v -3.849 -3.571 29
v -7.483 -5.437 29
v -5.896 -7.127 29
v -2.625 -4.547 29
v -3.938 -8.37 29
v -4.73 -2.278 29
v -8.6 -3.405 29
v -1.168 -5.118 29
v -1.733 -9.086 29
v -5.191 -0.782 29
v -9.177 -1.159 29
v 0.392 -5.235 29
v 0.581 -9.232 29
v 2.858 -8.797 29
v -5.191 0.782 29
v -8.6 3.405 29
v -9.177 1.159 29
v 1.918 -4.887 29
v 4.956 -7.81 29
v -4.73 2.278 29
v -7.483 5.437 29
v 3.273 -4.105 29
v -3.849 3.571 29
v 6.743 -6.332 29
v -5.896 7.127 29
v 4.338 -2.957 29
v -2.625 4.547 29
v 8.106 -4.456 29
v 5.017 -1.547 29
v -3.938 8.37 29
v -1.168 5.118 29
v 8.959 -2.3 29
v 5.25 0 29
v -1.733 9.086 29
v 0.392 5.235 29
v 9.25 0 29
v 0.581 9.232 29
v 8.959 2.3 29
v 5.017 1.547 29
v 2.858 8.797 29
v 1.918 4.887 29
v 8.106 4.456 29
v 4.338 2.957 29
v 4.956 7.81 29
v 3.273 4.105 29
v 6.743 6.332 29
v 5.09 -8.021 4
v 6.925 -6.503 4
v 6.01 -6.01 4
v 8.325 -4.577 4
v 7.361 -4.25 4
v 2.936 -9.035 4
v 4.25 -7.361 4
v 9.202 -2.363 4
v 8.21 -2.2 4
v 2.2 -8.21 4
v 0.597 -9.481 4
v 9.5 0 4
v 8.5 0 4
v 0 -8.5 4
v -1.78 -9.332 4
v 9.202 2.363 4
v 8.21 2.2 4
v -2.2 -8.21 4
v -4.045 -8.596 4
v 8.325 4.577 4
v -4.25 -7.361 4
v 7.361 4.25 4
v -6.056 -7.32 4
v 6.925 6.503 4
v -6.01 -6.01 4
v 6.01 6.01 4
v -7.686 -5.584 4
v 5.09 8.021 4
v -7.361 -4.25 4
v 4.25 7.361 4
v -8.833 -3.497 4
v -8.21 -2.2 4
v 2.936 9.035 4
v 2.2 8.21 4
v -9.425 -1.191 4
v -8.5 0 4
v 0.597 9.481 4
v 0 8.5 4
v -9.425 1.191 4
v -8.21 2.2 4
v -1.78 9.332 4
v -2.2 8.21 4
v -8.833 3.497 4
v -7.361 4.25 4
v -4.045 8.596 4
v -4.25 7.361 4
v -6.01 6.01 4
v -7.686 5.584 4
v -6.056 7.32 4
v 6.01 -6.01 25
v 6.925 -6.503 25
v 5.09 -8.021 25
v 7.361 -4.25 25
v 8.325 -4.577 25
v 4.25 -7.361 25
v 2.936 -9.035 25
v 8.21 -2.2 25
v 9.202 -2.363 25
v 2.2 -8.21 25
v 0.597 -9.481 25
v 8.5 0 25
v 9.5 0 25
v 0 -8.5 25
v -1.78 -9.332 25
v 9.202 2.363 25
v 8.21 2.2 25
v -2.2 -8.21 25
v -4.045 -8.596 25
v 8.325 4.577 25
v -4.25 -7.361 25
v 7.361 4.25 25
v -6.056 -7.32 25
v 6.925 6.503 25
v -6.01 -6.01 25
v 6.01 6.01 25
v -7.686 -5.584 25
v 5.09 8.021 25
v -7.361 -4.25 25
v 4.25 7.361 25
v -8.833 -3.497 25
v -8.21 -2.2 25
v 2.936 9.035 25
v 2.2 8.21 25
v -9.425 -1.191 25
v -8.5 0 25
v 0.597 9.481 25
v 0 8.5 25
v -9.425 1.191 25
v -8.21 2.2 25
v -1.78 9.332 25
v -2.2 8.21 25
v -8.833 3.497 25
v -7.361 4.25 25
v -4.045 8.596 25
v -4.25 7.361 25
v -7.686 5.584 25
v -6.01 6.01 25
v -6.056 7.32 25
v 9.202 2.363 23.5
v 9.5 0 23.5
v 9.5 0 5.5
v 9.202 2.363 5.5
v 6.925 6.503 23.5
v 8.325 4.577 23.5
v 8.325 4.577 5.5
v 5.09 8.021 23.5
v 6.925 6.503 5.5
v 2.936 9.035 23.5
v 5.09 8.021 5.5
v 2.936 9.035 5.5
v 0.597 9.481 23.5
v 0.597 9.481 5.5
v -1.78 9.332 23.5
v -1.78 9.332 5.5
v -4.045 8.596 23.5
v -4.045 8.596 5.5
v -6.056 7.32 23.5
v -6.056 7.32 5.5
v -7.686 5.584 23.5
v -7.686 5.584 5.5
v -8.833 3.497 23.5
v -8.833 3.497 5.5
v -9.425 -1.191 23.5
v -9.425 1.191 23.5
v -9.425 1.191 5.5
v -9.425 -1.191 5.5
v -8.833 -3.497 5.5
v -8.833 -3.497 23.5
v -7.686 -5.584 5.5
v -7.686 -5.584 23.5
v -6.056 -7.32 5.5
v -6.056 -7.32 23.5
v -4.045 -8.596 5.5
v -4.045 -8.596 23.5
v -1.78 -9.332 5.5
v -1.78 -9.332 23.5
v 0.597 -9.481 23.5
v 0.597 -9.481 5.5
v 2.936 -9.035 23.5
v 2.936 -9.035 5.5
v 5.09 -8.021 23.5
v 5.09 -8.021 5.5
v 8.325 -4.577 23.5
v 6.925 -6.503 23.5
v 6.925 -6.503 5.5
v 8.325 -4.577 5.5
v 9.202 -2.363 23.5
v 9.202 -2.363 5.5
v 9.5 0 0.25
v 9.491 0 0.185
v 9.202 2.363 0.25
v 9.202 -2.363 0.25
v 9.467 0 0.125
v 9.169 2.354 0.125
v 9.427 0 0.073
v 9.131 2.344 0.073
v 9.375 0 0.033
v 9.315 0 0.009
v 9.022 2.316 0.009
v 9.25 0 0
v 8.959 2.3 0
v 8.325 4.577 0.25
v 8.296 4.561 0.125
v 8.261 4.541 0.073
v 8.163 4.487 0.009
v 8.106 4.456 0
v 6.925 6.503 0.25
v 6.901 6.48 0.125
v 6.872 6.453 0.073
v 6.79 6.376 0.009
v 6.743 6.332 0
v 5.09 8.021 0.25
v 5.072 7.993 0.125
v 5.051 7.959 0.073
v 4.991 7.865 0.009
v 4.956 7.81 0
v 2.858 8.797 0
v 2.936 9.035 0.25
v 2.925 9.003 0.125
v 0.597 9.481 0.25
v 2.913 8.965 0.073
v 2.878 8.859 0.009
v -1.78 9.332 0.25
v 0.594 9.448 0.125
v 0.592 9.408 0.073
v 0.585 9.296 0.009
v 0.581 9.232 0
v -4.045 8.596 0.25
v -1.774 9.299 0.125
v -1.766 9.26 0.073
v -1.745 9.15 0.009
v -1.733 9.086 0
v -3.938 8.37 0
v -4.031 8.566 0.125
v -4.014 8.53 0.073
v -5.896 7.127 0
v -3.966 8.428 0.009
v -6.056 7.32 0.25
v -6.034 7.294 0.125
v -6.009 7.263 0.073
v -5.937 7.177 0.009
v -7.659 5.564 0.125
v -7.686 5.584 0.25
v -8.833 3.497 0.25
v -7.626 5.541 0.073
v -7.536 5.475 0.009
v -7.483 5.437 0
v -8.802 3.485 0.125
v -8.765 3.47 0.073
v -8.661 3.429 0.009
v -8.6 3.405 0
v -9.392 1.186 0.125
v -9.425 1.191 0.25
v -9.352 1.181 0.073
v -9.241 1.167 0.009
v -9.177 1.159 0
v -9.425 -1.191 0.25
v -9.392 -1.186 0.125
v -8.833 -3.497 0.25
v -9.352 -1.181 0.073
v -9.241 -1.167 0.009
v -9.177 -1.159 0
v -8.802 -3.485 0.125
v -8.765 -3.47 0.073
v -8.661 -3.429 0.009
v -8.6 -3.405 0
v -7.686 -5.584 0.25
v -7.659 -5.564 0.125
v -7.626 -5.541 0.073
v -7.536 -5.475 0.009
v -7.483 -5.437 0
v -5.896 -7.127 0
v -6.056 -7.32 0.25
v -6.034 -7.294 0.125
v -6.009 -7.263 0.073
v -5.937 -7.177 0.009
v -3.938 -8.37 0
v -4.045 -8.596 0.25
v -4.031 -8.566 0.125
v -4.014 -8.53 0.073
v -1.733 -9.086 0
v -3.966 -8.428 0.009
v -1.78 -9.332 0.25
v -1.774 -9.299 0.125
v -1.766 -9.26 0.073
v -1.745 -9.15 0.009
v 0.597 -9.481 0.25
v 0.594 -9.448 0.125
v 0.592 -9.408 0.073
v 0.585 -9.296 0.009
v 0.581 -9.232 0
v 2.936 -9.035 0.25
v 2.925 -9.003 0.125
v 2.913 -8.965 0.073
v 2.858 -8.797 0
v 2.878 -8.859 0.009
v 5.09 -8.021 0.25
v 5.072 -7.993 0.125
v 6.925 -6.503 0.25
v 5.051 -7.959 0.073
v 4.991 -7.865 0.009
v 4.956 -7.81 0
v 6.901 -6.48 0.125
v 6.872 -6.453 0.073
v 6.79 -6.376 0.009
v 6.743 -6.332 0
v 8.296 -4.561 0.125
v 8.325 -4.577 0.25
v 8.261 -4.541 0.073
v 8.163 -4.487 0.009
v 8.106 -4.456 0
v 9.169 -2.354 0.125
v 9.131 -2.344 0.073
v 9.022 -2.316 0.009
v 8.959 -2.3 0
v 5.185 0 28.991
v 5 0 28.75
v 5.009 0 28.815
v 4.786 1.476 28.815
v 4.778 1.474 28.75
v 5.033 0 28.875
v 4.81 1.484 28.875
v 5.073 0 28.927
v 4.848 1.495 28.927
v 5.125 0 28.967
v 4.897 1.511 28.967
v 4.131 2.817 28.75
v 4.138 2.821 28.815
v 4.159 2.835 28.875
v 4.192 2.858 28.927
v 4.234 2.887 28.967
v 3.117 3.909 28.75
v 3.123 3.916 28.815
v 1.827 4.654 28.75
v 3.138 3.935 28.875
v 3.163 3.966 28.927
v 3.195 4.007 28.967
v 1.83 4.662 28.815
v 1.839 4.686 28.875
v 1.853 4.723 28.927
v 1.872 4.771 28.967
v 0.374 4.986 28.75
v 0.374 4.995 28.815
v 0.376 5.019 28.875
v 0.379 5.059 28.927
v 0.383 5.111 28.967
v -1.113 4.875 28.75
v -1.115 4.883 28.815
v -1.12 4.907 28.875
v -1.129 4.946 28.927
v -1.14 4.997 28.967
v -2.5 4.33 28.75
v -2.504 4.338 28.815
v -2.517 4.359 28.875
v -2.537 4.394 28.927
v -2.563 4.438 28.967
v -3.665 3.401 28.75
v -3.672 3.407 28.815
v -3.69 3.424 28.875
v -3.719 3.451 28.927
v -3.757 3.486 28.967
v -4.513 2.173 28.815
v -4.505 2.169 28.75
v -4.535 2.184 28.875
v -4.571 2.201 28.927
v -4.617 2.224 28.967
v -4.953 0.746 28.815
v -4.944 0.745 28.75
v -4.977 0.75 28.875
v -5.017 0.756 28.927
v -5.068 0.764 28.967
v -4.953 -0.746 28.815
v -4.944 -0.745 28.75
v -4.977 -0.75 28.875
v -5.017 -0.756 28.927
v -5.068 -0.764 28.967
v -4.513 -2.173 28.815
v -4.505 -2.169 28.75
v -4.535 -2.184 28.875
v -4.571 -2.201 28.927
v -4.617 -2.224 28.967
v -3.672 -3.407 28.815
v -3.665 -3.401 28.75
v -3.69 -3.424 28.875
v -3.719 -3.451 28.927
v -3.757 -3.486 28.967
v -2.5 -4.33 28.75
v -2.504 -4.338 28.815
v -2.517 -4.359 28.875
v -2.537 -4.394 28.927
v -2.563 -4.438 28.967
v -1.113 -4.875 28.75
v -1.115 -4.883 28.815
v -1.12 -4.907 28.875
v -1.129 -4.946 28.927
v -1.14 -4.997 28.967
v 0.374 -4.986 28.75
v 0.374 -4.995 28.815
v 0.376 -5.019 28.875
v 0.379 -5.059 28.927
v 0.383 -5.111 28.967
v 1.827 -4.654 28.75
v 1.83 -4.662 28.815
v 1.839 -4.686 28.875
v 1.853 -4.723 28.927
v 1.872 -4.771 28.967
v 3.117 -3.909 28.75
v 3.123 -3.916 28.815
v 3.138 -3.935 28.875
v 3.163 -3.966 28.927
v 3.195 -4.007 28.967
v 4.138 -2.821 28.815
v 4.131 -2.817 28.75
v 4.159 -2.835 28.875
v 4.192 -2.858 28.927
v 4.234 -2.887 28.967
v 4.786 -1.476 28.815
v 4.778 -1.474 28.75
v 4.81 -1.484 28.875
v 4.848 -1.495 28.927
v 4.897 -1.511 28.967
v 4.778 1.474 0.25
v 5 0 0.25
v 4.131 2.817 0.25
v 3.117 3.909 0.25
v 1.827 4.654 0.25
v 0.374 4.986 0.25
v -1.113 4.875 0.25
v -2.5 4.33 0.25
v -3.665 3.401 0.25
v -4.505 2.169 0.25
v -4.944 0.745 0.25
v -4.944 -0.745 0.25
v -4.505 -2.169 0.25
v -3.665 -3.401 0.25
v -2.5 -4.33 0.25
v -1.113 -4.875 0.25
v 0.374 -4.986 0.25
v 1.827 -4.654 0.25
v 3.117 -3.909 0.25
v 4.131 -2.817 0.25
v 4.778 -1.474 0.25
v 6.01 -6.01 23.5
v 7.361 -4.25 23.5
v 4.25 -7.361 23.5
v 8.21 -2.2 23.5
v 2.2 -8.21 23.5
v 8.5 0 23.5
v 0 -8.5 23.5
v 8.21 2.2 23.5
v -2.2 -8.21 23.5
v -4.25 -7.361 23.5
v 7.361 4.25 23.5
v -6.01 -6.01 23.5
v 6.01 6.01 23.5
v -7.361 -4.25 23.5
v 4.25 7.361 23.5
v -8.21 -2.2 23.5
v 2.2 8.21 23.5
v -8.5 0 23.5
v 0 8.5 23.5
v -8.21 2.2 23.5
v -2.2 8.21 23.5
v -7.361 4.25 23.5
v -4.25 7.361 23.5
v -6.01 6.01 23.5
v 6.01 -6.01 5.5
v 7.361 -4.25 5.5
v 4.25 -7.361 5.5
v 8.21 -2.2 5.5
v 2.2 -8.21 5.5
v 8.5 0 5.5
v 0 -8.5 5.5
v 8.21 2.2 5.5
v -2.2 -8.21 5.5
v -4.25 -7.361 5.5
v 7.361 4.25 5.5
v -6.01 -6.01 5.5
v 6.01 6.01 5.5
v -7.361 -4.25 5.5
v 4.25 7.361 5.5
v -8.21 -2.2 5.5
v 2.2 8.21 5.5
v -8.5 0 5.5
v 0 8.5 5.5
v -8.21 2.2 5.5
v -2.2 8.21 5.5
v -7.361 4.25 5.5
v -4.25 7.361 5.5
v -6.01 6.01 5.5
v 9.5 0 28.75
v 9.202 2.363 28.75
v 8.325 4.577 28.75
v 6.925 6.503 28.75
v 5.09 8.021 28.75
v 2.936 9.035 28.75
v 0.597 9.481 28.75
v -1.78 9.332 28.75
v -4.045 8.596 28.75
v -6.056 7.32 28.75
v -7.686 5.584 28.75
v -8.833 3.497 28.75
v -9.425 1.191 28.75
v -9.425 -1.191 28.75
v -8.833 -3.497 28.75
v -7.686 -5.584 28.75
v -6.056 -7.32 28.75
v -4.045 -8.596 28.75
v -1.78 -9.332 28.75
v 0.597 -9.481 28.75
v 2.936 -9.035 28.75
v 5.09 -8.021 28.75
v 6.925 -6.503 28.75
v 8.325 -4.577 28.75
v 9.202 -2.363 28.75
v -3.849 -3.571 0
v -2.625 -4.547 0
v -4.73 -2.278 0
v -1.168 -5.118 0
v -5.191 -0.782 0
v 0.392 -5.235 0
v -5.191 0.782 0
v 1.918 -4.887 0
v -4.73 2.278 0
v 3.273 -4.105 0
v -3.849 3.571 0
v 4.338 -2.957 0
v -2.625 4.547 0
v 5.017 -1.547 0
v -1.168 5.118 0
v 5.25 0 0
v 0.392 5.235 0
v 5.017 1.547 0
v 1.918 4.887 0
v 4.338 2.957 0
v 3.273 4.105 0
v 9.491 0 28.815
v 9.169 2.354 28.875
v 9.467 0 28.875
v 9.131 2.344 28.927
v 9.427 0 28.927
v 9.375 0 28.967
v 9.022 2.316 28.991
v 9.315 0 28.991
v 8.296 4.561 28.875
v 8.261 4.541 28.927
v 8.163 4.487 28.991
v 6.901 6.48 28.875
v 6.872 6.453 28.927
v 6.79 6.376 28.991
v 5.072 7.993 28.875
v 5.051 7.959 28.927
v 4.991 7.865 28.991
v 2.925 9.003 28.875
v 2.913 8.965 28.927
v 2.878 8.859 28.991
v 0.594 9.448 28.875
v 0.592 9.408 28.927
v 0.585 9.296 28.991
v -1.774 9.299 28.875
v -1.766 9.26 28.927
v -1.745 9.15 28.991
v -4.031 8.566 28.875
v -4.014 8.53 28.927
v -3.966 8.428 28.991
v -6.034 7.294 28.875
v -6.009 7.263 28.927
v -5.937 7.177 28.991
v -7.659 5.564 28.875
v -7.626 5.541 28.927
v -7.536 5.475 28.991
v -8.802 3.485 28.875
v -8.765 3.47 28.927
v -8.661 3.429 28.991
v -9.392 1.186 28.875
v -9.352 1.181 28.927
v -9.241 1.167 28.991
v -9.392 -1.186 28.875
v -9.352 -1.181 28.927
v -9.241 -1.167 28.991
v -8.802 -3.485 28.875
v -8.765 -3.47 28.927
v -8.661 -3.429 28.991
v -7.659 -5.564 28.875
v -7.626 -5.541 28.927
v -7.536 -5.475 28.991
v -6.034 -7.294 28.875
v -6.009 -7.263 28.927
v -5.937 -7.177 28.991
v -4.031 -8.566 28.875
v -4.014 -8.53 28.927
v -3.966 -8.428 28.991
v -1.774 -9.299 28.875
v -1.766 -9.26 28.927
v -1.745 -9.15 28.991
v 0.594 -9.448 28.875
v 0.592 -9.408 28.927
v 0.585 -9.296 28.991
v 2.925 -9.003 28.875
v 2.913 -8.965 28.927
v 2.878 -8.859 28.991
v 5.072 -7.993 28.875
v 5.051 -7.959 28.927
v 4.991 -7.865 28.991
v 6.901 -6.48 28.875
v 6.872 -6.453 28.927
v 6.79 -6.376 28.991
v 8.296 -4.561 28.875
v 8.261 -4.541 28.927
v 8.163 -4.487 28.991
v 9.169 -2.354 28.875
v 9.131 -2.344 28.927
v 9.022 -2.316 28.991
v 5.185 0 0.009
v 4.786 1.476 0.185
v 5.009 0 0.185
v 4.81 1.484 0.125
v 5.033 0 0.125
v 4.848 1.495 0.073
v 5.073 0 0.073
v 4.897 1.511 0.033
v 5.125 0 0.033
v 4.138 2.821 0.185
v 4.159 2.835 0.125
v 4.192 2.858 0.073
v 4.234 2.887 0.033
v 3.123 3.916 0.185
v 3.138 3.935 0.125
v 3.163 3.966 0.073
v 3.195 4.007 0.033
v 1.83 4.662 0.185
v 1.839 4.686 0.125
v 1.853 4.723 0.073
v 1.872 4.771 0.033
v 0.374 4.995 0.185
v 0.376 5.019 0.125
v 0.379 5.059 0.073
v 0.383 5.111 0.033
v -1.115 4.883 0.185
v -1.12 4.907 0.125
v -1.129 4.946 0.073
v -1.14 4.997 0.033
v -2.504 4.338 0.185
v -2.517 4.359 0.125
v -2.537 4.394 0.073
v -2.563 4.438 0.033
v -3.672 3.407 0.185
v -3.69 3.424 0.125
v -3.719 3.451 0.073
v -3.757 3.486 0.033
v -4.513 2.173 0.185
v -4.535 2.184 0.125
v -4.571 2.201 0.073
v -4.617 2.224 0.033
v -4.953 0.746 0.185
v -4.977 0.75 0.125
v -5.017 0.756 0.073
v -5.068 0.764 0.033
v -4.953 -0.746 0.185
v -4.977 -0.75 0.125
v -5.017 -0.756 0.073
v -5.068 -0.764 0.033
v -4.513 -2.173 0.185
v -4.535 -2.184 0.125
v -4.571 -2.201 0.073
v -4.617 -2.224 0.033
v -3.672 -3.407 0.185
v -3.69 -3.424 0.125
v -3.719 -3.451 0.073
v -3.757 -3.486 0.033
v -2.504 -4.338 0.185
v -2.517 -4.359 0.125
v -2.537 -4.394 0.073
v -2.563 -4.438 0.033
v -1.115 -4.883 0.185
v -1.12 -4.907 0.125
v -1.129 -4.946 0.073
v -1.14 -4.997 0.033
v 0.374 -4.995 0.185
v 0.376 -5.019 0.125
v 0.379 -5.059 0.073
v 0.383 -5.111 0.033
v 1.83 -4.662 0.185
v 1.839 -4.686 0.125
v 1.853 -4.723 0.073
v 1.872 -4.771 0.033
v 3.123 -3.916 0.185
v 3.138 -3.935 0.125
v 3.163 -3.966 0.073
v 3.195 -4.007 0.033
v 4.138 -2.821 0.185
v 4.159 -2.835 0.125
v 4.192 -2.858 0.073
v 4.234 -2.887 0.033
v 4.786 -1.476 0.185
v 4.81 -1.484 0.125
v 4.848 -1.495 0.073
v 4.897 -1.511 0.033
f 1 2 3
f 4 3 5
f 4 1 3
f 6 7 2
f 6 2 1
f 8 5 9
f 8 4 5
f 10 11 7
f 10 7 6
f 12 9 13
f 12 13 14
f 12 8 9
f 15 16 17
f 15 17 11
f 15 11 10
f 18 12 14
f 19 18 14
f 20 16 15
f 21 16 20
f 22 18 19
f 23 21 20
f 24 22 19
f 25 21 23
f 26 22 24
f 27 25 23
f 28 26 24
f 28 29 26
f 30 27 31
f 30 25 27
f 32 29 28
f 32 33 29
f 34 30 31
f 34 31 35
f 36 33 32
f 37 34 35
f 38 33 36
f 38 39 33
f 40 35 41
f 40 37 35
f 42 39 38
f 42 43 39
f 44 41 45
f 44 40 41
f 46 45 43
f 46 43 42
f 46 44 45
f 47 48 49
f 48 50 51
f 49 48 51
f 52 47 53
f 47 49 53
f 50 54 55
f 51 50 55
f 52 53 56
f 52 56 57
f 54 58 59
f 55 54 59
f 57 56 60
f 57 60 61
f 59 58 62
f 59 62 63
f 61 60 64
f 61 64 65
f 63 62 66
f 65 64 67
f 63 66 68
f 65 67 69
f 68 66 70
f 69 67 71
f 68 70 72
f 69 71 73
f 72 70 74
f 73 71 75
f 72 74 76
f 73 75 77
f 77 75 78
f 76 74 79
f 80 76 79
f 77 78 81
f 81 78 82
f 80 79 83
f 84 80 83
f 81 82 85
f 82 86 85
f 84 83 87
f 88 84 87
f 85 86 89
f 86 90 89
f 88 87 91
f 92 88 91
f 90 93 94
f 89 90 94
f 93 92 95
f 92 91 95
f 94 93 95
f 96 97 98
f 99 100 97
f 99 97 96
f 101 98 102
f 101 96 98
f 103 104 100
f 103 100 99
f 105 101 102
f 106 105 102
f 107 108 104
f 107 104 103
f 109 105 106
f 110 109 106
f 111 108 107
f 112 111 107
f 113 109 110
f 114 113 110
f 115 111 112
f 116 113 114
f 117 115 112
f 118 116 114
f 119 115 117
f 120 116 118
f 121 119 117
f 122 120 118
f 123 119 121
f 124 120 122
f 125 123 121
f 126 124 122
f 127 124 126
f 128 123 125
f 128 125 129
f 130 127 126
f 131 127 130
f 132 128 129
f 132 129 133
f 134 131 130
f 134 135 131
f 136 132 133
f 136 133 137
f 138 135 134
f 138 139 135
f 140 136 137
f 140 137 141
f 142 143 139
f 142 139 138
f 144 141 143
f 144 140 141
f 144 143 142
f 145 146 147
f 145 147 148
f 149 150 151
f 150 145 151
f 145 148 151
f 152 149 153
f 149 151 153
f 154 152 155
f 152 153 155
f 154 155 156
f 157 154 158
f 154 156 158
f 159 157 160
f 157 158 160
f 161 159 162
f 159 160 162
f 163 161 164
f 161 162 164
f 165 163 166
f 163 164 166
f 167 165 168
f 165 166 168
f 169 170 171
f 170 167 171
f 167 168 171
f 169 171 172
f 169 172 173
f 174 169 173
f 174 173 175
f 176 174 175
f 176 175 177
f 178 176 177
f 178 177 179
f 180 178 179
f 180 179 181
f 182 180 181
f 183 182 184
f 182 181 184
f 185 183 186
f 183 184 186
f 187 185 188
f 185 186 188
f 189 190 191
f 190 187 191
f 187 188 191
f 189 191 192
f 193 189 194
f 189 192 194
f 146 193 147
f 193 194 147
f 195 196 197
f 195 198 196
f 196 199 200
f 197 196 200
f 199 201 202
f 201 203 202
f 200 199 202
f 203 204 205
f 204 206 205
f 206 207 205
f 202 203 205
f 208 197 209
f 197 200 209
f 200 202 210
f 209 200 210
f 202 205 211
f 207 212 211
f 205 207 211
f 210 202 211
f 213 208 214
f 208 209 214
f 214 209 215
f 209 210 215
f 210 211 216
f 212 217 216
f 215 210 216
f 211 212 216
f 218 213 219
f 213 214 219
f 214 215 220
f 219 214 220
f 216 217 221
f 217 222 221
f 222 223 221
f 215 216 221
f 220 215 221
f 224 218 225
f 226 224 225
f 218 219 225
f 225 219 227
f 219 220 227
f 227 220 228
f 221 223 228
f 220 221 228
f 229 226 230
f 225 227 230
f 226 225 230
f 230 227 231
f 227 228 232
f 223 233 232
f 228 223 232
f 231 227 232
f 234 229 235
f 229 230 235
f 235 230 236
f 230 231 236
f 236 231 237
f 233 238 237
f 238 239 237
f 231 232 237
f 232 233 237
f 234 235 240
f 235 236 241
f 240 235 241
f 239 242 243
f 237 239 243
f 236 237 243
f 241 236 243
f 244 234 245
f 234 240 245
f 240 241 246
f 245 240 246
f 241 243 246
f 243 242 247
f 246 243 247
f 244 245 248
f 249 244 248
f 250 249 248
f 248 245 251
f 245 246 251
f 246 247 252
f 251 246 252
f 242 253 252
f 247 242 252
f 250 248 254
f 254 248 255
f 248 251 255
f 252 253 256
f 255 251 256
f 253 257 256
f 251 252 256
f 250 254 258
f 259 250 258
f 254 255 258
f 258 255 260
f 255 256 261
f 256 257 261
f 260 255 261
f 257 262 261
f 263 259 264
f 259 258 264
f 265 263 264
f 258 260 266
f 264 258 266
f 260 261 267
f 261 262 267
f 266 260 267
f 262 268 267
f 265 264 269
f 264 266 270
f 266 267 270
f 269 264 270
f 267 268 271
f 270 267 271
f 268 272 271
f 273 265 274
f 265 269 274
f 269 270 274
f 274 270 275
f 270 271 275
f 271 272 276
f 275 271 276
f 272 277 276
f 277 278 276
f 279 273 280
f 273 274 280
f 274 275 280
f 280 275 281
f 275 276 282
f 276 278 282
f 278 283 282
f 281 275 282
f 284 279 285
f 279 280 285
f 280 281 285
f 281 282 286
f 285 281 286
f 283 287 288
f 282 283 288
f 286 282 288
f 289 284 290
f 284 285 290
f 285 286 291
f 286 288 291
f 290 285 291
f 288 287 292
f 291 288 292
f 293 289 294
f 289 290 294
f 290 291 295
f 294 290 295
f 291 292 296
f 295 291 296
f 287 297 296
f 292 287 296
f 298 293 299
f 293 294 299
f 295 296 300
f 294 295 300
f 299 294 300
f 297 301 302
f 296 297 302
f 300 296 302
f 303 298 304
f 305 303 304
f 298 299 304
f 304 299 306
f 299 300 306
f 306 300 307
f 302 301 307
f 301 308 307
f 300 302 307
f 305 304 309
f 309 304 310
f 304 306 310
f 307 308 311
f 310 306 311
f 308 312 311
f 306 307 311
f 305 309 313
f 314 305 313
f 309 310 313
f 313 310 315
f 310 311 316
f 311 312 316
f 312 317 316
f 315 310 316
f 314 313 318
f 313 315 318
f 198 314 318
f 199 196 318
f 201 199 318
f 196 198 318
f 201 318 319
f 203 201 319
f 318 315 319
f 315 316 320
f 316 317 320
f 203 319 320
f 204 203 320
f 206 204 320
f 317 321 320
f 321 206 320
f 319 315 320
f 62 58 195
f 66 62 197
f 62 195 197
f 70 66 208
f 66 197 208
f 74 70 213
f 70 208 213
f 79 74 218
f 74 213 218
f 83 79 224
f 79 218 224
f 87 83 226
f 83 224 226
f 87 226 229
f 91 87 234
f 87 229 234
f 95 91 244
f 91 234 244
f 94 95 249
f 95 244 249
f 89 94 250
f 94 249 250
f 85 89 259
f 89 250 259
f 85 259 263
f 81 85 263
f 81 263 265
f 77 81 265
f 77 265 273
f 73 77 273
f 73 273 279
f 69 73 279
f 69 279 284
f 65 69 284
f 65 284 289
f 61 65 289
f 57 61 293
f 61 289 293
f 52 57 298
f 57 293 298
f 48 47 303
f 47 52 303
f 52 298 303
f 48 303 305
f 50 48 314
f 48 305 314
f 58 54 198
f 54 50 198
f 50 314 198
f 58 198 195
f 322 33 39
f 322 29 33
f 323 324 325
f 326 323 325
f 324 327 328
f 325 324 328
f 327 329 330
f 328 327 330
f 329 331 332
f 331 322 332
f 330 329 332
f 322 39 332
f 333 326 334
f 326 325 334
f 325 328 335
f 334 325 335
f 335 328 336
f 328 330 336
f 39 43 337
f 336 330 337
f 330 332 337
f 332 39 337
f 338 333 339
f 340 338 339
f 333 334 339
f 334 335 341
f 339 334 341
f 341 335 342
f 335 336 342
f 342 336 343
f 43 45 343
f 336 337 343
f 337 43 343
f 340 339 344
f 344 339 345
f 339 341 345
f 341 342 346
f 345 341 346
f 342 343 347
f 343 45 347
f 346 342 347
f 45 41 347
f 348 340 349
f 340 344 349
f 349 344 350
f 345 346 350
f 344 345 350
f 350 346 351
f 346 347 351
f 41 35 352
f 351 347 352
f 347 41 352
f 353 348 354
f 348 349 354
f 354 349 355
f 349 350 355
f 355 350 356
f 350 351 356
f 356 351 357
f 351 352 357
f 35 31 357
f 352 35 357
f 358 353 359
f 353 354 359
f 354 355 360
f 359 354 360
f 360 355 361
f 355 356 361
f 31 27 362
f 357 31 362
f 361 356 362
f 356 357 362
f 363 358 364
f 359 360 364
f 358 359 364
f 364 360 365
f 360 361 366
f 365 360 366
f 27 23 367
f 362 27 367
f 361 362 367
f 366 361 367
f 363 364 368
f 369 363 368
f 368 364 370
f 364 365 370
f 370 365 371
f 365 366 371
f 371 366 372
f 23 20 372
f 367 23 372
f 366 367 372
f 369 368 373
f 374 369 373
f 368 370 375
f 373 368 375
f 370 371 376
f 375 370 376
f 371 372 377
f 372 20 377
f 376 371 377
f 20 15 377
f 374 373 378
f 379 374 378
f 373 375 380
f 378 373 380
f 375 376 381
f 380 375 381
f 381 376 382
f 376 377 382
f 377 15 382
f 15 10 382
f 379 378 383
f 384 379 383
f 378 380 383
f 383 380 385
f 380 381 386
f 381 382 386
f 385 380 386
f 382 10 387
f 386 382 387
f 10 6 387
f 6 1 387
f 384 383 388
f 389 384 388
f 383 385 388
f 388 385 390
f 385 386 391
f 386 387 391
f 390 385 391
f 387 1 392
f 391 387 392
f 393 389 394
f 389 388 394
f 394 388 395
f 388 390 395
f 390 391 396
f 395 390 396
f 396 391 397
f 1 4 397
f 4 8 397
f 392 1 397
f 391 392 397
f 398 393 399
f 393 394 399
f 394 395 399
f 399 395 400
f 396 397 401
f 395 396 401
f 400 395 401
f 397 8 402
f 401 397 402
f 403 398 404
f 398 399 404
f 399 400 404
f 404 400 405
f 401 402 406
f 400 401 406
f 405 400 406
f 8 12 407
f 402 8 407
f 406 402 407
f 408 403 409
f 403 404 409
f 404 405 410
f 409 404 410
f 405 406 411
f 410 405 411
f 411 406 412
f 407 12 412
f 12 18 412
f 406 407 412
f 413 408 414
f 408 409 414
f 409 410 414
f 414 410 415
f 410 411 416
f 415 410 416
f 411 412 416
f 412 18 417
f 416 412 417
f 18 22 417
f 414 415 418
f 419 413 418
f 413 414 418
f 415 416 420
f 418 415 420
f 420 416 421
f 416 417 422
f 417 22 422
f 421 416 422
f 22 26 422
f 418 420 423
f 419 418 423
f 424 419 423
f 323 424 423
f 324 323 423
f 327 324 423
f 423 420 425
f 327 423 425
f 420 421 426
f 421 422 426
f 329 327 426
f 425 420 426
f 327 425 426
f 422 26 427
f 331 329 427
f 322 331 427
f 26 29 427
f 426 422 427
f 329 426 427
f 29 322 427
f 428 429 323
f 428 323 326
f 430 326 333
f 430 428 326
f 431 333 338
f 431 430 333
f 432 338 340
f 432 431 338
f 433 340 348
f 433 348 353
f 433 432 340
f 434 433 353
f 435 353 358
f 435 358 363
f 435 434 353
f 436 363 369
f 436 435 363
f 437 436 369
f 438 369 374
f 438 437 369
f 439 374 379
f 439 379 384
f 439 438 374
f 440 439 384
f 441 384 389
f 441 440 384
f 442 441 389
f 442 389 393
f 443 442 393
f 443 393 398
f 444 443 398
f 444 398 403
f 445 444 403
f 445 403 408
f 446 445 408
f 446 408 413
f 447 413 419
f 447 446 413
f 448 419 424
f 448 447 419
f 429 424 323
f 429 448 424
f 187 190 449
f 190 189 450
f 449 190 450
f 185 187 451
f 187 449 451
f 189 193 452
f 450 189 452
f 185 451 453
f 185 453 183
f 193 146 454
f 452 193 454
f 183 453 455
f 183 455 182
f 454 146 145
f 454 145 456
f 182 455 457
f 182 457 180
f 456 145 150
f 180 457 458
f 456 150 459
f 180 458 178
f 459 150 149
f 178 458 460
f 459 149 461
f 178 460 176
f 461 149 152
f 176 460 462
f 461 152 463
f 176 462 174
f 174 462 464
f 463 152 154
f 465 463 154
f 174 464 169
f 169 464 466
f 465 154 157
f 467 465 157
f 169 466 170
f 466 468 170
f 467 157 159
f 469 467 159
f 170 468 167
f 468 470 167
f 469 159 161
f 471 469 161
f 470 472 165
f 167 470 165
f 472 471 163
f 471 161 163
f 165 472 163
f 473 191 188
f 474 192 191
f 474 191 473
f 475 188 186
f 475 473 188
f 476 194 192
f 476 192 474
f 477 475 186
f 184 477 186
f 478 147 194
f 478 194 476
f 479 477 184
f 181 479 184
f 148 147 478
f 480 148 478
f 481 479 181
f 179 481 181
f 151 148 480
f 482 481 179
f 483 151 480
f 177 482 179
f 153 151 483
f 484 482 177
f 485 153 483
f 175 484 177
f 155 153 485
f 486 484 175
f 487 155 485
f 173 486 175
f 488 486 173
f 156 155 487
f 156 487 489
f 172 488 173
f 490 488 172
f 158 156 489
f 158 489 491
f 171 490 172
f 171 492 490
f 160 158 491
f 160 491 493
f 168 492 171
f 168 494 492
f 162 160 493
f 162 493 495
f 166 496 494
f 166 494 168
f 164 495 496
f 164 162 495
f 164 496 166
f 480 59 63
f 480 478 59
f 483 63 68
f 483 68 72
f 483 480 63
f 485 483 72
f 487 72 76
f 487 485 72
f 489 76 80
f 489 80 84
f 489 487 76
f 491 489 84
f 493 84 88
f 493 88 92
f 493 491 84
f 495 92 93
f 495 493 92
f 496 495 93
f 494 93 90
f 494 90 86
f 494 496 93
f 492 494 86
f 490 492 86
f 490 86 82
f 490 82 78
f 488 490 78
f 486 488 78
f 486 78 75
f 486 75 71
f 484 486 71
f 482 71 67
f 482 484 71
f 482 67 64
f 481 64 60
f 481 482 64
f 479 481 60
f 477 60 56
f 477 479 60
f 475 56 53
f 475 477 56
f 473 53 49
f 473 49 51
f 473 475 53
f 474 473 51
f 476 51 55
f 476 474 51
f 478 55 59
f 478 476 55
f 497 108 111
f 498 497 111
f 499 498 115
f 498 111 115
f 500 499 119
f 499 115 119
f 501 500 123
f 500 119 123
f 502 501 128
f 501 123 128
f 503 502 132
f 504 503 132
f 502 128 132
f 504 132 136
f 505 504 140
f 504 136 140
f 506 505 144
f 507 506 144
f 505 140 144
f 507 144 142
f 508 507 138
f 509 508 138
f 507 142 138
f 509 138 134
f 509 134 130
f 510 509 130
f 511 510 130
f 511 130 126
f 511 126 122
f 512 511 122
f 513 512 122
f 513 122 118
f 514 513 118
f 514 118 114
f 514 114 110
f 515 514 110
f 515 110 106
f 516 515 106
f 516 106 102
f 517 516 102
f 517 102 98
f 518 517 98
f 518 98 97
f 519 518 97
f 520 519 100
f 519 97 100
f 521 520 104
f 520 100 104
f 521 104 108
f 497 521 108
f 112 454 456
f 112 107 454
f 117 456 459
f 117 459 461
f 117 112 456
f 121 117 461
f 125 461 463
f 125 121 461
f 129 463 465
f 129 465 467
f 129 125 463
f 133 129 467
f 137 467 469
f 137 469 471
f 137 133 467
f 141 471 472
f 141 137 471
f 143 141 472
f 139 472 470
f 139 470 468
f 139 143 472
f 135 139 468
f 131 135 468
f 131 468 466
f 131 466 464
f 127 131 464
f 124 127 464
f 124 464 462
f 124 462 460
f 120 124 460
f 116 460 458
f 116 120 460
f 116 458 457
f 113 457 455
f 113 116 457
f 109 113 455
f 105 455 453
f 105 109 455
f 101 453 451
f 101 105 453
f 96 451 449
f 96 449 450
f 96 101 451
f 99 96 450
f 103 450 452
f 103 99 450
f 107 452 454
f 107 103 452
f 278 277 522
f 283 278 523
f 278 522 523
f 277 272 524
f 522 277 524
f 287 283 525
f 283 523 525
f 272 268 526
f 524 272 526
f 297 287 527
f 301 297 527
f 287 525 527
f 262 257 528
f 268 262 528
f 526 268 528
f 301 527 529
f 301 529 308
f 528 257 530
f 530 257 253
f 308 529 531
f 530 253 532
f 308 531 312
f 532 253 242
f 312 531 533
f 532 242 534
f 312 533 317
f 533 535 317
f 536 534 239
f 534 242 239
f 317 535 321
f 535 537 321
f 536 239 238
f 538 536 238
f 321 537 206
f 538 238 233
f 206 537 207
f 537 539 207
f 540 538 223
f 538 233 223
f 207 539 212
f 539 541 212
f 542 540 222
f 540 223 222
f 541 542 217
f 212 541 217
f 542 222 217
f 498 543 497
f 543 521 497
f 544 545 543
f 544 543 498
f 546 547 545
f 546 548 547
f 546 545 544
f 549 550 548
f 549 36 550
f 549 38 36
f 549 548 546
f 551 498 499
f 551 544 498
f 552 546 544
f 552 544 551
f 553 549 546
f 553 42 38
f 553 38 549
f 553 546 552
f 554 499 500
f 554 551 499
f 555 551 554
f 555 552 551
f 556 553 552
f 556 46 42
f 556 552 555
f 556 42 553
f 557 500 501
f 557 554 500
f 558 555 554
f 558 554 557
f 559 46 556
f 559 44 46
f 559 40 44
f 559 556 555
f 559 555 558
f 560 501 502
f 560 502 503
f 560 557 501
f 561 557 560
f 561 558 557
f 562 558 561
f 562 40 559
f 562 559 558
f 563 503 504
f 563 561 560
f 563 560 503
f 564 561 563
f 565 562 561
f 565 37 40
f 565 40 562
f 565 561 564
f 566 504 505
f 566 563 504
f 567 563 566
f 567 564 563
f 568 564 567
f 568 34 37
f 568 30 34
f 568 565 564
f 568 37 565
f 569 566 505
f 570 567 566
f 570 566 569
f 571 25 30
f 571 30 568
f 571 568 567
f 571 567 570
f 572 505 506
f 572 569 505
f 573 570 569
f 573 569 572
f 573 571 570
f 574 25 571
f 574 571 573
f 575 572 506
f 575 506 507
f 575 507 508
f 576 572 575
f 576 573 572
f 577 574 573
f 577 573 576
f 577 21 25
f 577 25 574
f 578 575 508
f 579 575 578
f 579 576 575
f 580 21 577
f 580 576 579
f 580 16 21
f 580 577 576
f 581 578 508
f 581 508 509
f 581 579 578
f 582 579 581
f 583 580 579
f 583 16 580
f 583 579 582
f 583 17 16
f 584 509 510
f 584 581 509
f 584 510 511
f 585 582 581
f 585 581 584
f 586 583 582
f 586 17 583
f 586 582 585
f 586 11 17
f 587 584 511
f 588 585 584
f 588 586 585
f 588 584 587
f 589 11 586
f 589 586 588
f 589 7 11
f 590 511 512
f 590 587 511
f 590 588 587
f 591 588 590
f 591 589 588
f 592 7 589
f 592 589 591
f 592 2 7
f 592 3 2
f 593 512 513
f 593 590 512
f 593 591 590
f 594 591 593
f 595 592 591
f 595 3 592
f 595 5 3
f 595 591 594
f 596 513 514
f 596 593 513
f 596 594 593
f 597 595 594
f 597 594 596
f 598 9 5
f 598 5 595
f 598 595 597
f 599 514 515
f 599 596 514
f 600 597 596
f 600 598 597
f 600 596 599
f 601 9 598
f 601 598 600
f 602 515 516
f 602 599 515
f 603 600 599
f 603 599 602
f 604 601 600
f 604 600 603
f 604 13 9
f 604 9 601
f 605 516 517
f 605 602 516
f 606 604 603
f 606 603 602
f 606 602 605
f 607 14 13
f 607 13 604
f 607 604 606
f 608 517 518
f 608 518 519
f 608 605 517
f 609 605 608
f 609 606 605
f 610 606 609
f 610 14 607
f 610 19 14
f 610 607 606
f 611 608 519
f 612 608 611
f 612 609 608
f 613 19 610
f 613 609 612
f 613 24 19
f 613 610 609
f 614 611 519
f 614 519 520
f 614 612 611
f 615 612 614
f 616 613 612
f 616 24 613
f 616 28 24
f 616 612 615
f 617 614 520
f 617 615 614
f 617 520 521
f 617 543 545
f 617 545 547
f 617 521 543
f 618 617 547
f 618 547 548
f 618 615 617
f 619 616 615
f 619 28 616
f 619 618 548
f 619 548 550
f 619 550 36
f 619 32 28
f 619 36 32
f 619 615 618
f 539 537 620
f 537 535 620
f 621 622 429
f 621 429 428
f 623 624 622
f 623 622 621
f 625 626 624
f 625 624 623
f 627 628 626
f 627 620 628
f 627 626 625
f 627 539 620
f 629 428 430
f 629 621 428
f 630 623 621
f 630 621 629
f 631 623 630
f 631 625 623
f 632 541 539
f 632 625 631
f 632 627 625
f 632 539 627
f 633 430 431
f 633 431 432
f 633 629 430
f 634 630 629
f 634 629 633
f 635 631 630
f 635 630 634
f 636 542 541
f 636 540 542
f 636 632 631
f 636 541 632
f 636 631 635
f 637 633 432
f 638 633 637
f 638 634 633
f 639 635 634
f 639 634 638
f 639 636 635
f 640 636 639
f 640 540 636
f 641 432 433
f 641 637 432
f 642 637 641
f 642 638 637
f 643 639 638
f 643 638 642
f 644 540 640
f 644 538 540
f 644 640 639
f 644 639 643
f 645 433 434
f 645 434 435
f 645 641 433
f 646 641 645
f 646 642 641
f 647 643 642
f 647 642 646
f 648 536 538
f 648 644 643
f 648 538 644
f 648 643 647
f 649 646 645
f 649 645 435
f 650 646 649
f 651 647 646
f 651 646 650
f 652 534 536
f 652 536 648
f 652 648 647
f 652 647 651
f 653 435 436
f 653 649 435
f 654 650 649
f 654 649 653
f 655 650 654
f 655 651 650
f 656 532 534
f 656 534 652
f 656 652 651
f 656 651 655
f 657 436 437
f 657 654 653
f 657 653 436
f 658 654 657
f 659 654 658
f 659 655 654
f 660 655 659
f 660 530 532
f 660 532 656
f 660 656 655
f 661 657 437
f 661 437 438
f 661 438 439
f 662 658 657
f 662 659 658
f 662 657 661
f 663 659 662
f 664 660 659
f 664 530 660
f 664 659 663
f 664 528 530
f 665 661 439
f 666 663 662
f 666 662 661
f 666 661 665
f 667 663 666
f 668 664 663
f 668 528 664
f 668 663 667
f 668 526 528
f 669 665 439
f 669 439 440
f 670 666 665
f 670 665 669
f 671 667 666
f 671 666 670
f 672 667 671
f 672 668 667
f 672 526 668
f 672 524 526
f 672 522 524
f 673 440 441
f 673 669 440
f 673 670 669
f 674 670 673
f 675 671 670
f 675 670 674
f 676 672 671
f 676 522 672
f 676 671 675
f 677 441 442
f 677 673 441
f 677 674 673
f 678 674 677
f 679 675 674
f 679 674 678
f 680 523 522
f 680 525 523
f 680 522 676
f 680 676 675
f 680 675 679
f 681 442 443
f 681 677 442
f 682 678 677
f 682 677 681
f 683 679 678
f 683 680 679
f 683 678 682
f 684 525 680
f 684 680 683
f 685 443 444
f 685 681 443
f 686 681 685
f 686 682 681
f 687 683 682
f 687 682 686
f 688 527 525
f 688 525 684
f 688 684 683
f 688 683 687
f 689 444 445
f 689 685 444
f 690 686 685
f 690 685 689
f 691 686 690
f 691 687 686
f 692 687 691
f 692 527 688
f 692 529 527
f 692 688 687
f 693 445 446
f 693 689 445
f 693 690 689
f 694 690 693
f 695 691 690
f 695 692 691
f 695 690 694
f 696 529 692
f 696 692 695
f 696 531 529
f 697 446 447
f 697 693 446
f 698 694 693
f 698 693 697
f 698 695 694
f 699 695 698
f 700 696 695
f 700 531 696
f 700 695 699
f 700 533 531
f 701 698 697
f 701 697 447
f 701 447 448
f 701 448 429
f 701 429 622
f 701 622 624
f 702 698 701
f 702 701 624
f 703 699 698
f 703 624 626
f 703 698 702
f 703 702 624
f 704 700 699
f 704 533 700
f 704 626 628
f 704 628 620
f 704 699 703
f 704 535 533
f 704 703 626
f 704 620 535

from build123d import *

# Parameters (mm, degrees)
F0_R     = 9.5
F0_R_2   = 5
F1_DEPTH = 29
F2_R     = 0.25
F3_W     = 3
F3_H     = 1.5


with BuildPart() as f1:
    # F0 (on Top) → F1 (new body)
    with BuildSketch(Plane.XY):
        Circle(F0_R)
        Circle(F0_R_2, mode=Mode.SUBTRACT)
    extrude(amount=F1_DEPTH)

    # F2
    f2_edges = [f1.edges().sort_by_distance(p)[0] for p in [
        (-9.5, 0, 29),
        (-5, 0, 29),
        (-9.5, 0, 0),
        (-5, 0, 0),
    ]]
    fillet(f2_edges, radius=F2_R)

    # F3 (on Front) → F4 (revolve, cut)
    with BuildSketch(Plane.XZ):
        with Locations((10, 24.25)):
            Rectangle(F3_W, F3_H)
        with Locations((10, 4.75)):
            Rectangle(F3_W, F3_H)
    revolve(axis=Axis((0, 0, 23.490791), (0, 0, 1)), mode=Mode.SUBTRACT)


solid = f1.part
